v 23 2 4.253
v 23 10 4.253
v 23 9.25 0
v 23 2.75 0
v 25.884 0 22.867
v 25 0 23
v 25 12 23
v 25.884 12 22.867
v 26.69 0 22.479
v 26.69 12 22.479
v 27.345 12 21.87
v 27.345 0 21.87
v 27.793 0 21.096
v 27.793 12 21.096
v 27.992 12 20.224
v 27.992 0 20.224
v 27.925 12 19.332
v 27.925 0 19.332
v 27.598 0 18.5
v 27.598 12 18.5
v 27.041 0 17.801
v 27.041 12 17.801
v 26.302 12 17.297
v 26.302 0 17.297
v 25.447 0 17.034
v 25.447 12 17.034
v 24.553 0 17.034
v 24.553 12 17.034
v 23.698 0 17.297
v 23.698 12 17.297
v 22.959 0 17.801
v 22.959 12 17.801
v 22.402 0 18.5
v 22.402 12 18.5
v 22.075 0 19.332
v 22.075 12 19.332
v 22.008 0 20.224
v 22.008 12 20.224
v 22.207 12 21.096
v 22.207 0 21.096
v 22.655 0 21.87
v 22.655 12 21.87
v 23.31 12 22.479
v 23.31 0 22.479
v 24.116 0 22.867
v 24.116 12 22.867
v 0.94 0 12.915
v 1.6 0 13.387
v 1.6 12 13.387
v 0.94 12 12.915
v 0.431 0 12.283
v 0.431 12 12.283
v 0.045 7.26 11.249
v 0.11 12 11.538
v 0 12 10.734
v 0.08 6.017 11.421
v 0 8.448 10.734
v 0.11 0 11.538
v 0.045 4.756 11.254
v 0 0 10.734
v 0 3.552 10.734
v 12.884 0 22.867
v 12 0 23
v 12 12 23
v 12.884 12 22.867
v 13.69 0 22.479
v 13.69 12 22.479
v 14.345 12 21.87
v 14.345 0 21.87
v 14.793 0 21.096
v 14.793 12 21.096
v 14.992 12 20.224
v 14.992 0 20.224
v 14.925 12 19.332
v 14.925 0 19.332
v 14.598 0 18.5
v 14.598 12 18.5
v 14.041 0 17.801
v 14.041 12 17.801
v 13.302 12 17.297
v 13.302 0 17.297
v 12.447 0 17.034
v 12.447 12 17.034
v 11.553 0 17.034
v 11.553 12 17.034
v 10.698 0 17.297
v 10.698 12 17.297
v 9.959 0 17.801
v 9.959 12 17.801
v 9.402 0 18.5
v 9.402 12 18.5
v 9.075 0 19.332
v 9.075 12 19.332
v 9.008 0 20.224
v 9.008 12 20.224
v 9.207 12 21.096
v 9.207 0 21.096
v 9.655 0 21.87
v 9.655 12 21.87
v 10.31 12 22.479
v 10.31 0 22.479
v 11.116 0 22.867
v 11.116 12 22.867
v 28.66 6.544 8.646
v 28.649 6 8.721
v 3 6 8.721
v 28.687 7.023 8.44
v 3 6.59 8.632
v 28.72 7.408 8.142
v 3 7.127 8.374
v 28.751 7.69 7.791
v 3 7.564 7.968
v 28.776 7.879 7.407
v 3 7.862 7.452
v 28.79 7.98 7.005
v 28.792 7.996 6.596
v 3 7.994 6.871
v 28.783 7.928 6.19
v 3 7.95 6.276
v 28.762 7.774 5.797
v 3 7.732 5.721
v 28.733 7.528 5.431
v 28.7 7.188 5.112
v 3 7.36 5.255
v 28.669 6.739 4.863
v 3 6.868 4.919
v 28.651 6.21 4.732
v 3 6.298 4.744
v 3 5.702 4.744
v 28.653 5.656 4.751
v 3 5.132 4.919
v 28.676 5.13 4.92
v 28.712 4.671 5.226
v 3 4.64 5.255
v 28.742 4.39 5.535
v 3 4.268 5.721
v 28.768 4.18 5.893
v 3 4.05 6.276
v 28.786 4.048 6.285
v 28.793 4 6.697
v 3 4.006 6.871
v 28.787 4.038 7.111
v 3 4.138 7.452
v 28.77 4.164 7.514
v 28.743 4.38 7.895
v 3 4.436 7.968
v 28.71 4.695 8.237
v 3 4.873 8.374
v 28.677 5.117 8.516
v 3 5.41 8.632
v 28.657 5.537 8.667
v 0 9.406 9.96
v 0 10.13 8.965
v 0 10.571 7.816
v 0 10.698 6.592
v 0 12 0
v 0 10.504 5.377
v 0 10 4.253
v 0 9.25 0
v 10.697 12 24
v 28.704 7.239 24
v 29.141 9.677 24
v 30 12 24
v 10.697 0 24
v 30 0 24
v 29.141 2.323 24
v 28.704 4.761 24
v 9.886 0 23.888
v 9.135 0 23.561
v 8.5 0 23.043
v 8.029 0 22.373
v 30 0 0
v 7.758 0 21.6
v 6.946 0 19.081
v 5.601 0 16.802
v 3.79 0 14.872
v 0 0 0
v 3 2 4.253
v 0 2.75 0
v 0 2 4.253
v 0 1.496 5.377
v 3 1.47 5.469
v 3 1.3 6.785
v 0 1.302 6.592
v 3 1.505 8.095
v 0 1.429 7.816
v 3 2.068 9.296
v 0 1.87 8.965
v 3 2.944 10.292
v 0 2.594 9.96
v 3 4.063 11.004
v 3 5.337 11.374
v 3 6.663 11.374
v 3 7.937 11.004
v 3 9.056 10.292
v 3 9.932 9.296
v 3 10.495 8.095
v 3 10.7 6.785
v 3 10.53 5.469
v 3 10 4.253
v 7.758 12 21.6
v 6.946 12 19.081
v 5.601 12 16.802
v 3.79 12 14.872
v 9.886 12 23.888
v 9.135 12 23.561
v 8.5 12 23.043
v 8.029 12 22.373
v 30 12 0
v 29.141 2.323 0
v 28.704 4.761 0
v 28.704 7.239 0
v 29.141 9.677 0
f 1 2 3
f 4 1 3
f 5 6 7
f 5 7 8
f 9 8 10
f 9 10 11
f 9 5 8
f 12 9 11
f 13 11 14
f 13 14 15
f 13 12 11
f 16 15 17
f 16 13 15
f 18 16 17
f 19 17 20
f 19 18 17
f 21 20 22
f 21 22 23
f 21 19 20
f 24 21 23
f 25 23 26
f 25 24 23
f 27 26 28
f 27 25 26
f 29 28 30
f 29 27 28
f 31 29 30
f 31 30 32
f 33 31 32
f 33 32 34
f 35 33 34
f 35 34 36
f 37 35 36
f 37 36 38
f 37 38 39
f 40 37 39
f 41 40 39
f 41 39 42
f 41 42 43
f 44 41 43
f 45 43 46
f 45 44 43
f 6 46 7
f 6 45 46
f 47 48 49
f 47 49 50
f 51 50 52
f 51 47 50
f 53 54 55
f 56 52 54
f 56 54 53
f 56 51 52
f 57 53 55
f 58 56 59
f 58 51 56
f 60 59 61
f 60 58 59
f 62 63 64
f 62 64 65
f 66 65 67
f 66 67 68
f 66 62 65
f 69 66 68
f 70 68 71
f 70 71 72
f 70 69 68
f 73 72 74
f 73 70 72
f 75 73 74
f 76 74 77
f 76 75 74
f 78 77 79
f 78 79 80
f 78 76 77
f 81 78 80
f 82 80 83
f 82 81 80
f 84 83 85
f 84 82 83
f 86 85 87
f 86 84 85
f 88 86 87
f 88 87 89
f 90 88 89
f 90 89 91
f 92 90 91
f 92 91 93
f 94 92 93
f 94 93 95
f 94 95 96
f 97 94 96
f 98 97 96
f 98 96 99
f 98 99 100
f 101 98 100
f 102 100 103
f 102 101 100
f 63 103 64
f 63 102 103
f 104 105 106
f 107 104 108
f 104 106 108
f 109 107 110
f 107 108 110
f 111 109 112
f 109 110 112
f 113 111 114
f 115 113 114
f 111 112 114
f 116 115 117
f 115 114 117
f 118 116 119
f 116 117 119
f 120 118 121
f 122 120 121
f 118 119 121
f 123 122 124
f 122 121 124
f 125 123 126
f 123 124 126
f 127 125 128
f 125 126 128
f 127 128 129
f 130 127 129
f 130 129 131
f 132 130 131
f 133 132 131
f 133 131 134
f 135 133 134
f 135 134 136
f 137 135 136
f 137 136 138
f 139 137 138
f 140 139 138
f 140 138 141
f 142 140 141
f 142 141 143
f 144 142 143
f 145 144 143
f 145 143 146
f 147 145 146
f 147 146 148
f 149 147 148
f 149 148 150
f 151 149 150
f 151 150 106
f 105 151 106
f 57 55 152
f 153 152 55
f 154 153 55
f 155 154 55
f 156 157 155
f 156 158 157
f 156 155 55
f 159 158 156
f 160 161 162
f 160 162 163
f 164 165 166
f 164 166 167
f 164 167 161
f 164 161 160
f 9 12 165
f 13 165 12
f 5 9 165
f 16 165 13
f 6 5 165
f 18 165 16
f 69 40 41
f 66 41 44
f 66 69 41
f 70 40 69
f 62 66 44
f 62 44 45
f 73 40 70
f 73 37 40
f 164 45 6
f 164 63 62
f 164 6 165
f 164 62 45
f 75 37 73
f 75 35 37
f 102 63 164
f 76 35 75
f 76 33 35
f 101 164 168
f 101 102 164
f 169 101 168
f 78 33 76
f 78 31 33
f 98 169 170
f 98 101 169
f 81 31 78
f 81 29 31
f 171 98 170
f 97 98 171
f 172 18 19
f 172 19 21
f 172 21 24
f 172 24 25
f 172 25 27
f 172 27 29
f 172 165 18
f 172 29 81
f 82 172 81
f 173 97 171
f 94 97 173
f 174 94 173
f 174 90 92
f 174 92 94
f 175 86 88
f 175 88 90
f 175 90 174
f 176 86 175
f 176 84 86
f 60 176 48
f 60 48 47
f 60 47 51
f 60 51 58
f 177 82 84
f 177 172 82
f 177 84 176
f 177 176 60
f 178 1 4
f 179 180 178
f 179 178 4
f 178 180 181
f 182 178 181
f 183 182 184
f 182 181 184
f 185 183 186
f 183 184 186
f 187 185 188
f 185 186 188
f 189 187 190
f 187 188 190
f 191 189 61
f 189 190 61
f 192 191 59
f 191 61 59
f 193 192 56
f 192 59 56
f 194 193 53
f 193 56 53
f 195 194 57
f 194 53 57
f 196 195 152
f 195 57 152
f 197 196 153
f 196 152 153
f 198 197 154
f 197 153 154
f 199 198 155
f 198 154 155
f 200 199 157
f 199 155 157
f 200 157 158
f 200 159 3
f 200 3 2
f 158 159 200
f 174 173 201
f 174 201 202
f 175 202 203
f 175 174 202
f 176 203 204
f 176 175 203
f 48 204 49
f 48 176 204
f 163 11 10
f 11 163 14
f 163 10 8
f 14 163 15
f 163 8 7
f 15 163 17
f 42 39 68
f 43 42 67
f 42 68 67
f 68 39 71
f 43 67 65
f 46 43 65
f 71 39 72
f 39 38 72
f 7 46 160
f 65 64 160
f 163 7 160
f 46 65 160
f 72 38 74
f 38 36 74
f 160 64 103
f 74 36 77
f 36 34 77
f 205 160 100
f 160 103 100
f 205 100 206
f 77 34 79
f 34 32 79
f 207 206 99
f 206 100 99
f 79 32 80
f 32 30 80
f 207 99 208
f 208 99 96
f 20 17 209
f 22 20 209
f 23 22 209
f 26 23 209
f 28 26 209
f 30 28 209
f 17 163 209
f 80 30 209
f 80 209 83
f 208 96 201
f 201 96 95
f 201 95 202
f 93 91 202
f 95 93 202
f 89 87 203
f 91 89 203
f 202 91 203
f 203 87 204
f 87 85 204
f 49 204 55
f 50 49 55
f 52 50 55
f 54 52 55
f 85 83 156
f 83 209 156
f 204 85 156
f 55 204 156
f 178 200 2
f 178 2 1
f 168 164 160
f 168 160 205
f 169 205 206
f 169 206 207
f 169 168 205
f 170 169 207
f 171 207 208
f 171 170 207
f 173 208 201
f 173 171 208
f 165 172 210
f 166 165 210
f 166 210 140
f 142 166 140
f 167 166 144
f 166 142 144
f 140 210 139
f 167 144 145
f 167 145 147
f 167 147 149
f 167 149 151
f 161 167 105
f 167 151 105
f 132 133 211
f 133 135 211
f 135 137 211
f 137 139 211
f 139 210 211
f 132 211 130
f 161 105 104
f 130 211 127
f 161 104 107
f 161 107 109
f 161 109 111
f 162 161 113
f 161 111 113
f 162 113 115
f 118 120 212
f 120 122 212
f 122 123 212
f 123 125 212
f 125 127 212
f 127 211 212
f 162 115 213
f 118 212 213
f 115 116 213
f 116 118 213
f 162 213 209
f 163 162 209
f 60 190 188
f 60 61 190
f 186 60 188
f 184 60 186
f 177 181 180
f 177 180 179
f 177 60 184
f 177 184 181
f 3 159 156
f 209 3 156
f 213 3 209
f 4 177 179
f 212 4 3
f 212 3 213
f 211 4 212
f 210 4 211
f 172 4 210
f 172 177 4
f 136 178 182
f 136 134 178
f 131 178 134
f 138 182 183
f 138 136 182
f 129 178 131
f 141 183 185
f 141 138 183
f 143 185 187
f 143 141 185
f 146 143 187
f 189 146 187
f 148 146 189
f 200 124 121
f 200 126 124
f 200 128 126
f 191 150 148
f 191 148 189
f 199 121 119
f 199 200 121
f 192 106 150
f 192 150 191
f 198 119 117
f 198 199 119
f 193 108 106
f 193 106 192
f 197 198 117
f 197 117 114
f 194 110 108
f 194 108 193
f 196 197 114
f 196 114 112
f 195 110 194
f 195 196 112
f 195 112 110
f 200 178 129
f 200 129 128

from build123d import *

# Parameters (mm, degrees)
SKETCH_1_R          = 3
EXTRUDE_1_DEPTH     = 12
CUT_EXTRUDE_1_DEPTH = 41.249223595
CUT_EXTRUDE_2_DEPTH = 23
SKETCH_4_R          = 2
CUT_EXTRUDE_3_DEPTH = 3
SKETCH_4_2_R        = 2
CUT_EXTRUDE_4_DEPTH = 41.249223625


with BuildPart() as part:
    # 草图1 → 凸台-拉伸1 (new body)
    with BuildSketch(Plane(origin=(0, 0, 0), x_dir=(1, 0, 0), z_dir=(0, 1, 0))):
        with BuildLine():
            Line((0, 0), (30, 0))
            Line((30, 0), (30, -24))
            Line((30, -24), (10.696938457, -24))
            ThreePointArc((10.696938457, -24), (8.799571861, -23.323790008), (7.757550765, -21.6))
            ThreePointArc((7.757550765, -21.6), (5.601317771, -16.801757364), (1.6, -13.386800671))
            ThreePointArc((1.6, -13.386800671), (0.430953484, -12.282694177), (0, -10.733500839))
            Line((0, -10.733500839), (0, 0))
        make_face()
        with Locations((12, -20)):
            Circle(SKETCH_1_R, mode=Mode.SUBTRACT)
        with Locations((25, -20)):
            Circle(SKETCH_1_R, mode=Mode.SUBTRACT)
    extrude(amount=EXTRUDE_1_DEPTH)

    # 草图2 → 切除-拉伸1 (cut, through all)
    with BuildSketch(Plane(origin=(0, 0, 0), x_dir=(-1, 0, 0), z_dir=(0, 0, -1))):
        with BuildLine():
            Line((-30, 12), (-30, 0))
            ThreePointArc((-30, 0), (-28.649110641, 6), (-30, 12))
        make_face()
    extrude(amount=-CUT_EXTRUDE_1_DEPTH, mode=Mode.SUBTRACT)

    # 草图3 → 切除-拉伸2 (cut)
    with BuildSketch(Plane.ZY):
        Polygon((0, 2.75), (0, 9.25), (4.253461365, 10), (4.253461365, 2), align=None)
    extrude(amount=-CUT_EXTRUDE_2_DEPTH, mode=Mode.SUBTRACT)

    # 草图4 → 切除-拉伸3 (cut)
    with BuildSketch(Plane.ZY):
        with BuildLine():
            Line((4.253461365, 10), (4.253461365, 2))
            ThreePointArc((4.253461365, 2), (11.421253901, 6), (4.253461365, 10))
        make_face()
        with Locations((6.721253901, 6)):
            Circle(SKETCH_4_R, mode=Mode.SUBTRACT)
    extrude(amount=-CUT_EXTRUDE_3_DEPTH, mode=Mode.SUBTRACT)

    # 草图4<2> → 切除-拉伸4 (cut, through all)
    with BuildSketch(Plane.ZY):
        with Locations((6.721253901, 6)):
            Circle(SKETCH_4_2_R)
    extrude(amount=-CUT_EXTRUDE_4_DEPTH, mode=Mode.SUBTRACT)


solid = part.part
